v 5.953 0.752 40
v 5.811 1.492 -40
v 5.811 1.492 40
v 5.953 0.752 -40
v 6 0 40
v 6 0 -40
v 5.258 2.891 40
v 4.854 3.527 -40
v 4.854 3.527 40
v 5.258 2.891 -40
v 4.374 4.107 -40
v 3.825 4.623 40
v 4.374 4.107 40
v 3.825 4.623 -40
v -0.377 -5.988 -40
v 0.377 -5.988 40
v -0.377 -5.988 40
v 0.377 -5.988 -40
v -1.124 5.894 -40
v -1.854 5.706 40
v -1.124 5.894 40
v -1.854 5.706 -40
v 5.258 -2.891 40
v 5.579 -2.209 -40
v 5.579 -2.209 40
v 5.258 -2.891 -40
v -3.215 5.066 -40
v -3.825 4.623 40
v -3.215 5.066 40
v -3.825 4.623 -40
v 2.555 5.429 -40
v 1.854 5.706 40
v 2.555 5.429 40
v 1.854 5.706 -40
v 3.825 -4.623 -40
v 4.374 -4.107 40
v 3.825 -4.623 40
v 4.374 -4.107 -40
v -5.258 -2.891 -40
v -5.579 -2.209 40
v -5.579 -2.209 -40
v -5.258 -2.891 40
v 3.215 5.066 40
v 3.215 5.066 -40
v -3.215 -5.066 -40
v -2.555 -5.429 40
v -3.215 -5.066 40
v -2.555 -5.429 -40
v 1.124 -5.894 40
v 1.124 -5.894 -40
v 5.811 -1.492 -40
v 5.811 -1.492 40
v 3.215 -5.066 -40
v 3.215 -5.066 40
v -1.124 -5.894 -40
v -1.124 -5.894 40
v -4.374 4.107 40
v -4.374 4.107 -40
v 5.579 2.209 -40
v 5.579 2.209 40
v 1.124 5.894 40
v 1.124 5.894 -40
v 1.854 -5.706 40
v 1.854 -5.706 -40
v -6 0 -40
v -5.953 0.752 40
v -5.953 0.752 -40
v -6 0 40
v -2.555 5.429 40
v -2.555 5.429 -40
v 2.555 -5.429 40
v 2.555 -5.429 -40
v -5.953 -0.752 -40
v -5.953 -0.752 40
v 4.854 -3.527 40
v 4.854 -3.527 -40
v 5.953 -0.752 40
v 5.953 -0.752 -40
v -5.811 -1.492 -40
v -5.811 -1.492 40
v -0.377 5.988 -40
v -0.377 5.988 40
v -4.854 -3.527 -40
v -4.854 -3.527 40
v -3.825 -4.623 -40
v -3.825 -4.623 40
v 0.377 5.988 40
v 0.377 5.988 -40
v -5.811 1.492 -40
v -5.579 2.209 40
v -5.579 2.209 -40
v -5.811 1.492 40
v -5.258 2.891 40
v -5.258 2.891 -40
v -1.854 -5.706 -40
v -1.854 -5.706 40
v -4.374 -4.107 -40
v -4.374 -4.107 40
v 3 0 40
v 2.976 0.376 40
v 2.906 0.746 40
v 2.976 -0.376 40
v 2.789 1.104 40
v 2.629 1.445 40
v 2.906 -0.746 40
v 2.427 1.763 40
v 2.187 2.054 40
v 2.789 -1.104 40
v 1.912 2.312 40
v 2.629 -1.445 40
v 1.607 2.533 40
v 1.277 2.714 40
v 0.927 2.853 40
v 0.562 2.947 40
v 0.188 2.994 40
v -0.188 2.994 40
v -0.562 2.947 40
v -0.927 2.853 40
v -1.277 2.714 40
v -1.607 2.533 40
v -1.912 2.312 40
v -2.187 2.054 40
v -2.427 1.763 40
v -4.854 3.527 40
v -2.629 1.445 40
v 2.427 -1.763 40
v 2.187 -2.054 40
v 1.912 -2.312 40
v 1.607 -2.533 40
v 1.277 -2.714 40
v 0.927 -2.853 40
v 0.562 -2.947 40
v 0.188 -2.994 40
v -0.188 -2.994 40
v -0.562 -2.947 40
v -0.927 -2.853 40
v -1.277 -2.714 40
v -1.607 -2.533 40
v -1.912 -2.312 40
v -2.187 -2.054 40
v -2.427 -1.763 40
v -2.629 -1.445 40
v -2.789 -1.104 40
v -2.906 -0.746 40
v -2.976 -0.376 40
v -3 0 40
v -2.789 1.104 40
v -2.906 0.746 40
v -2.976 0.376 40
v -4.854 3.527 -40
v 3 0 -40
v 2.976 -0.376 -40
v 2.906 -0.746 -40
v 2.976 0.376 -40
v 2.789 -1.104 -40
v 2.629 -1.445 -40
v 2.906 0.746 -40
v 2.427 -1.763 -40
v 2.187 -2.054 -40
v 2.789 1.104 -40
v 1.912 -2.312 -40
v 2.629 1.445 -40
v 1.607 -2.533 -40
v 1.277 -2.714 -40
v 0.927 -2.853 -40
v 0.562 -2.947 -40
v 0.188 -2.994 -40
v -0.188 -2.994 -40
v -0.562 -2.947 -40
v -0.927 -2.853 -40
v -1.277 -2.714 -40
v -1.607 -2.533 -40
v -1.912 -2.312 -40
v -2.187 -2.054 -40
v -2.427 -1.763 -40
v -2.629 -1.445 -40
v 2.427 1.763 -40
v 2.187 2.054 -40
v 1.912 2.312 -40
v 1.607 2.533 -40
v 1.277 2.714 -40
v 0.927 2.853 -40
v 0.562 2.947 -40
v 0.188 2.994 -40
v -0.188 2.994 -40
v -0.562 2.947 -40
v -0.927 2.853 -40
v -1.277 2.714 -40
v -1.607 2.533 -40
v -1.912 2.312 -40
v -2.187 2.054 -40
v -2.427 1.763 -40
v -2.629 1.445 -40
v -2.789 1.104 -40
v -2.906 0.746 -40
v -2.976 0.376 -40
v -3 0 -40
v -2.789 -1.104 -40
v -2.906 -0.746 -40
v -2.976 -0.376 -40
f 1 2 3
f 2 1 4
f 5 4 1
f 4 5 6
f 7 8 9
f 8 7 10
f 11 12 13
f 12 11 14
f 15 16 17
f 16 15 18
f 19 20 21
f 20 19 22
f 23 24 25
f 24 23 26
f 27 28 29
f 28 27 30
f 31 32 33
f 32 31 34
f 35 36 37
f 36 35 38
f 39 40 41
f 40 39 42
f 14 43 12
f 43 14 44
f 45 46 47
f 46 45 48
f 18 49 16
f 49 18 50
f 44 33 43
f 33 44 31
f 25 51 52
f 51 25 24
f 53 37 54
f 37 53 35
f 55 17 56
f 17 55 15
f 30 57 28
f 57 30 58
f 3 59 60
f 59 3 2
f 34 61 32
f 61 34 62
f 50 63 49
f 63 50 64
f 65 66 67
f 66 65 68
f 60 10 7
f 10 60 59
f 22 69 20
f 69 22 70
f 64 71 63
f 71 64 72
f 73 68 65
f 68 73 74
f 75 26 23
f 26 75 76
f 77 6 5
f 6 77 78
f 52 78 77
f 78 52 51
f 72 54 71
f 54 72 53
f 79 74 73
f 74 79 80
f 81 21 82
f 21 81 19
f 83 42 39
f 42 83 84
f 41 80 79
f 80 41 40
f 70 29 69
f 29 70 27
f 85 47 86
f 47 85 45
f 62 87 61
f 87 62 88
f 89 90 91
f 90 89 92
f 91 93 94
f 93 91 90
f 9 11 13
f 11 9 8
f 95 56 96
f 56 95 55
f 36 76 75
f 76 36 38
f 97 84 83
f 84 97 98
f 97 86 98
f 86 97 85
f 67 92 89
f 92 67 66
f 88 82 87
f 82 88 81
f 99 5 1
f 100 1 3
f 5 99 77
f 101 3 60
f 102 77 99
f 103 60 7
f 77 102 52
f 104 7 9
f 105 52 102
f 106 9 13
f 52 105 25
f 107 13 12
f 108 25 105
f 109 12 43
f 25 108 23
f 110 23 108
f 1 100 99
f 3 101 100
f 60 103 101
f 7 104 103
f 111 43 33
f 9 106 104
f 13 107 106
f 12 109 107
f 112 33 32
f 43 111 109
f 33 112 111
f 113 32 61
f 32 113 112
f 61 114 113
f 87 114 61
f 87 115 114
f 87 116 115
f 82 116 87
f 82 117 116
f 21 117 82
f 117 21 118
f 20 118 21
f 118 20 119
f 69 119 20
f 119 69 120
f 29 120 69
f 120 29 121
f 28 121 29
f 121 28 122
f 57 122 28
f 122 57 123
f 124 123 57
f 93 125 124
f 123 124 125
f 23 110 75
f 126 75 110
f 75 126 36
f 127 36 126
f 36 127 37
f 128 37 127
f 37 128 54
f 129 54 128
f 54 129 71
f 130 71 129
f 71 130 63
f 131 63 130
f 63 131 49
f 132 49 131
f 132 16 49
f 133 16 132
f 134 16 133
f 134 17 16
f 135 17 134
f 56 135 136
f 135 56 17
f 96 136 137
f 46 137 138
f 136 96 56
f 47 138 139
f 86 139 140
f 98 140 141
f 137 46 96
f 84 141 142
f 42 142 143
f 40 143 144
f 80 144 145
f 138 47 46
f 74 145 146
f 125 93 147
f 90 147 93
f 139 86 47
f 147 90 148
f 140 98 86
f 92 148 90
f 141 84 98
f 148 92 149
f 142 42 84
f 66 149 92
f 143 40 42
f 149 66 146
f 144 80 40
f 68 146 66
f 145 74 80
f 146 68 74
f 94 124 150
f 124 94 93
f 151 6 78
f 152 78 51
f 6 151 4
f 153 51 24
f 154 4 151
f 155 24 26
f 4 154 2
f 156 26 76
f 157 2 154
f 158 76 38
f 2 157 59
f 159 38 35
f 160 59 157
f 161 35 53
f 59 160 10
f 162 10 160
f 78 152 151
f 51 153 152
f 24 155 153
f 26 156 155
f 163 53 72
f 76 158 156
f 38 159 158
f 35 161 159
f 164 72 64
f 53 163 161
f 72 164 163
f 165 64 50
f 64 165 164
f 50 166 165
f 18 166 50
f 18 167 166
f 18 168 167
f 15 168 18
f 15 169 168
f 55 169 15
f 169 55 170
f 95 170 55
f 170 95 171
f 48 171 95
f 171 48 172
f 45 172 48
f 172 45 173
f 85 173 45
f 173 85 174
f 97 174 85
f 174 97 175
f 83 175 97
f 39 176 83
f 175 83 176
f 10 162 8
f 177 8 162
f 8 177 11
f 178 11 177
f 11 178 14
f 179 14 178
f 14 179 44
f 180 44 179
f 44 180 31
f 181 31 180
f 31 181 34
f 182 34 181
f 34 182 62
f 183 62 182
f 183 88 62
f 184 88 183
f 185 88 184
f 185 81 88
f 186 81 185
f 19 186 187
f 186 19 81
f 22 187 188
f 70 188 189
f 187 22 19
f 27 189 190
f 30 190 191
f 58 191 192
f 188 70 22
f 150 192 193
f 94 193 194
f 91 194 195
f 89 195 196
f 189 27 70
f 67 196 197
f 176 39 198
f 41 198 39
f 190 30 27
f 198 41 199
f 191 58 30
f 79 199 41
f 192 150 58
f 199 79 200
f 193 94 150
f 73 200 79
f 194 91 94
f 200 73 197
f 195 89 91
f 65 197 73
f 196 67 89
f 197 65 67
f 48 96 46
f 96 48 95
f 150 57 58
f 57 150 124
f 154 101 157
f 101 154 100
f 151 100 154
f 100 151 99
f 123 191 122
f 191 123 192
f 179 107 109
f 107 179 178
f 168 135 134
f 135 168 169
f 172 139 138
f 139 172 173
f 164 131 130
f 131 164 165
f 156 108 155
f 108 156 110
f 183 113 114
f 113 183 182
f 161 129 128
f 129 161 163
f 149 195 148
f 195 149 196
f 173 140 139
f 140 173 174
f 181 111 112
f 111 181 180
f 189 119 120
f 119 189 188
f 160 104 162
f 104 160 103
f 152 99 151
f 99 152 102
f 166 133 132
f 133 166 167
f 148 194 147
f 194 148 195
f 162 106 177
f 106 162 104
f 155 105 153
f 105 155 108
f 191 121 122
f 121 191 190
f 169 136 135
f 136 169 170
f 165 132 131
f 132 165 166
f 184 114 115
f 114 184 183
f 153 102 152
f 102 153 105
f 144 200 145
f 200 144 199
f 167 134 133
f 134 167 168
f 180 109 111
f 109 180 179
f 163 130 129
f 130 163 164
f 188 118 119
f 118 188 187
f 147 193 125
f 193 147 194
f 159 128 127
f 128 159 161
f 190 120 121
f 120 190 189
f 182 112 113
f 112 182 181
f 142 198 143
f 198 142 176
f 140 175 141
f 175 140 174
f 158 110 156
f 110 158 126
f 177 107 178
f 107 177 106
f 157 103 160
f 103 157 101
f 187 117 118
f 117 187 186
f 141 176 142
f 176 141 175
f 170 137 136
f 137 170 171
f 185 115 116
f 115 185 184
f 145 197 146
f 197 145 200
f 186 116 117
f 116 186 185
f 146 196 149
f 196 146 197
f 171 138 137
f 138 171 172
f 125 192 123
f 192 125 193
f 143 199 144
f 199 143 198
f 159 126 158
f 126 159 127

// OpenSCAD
$fn = 50;


difference() {
	union() {
		translate(v = [0, 0, -40.0000000000]) {
			cylinder(h = 80, r = 6.0000000000);
		}
	}
	union() {
		translate(v = [0, 0, -100.0000000000]) {
			cylinder(h = 200, r = 3.0000000000);
		}
	}
}
